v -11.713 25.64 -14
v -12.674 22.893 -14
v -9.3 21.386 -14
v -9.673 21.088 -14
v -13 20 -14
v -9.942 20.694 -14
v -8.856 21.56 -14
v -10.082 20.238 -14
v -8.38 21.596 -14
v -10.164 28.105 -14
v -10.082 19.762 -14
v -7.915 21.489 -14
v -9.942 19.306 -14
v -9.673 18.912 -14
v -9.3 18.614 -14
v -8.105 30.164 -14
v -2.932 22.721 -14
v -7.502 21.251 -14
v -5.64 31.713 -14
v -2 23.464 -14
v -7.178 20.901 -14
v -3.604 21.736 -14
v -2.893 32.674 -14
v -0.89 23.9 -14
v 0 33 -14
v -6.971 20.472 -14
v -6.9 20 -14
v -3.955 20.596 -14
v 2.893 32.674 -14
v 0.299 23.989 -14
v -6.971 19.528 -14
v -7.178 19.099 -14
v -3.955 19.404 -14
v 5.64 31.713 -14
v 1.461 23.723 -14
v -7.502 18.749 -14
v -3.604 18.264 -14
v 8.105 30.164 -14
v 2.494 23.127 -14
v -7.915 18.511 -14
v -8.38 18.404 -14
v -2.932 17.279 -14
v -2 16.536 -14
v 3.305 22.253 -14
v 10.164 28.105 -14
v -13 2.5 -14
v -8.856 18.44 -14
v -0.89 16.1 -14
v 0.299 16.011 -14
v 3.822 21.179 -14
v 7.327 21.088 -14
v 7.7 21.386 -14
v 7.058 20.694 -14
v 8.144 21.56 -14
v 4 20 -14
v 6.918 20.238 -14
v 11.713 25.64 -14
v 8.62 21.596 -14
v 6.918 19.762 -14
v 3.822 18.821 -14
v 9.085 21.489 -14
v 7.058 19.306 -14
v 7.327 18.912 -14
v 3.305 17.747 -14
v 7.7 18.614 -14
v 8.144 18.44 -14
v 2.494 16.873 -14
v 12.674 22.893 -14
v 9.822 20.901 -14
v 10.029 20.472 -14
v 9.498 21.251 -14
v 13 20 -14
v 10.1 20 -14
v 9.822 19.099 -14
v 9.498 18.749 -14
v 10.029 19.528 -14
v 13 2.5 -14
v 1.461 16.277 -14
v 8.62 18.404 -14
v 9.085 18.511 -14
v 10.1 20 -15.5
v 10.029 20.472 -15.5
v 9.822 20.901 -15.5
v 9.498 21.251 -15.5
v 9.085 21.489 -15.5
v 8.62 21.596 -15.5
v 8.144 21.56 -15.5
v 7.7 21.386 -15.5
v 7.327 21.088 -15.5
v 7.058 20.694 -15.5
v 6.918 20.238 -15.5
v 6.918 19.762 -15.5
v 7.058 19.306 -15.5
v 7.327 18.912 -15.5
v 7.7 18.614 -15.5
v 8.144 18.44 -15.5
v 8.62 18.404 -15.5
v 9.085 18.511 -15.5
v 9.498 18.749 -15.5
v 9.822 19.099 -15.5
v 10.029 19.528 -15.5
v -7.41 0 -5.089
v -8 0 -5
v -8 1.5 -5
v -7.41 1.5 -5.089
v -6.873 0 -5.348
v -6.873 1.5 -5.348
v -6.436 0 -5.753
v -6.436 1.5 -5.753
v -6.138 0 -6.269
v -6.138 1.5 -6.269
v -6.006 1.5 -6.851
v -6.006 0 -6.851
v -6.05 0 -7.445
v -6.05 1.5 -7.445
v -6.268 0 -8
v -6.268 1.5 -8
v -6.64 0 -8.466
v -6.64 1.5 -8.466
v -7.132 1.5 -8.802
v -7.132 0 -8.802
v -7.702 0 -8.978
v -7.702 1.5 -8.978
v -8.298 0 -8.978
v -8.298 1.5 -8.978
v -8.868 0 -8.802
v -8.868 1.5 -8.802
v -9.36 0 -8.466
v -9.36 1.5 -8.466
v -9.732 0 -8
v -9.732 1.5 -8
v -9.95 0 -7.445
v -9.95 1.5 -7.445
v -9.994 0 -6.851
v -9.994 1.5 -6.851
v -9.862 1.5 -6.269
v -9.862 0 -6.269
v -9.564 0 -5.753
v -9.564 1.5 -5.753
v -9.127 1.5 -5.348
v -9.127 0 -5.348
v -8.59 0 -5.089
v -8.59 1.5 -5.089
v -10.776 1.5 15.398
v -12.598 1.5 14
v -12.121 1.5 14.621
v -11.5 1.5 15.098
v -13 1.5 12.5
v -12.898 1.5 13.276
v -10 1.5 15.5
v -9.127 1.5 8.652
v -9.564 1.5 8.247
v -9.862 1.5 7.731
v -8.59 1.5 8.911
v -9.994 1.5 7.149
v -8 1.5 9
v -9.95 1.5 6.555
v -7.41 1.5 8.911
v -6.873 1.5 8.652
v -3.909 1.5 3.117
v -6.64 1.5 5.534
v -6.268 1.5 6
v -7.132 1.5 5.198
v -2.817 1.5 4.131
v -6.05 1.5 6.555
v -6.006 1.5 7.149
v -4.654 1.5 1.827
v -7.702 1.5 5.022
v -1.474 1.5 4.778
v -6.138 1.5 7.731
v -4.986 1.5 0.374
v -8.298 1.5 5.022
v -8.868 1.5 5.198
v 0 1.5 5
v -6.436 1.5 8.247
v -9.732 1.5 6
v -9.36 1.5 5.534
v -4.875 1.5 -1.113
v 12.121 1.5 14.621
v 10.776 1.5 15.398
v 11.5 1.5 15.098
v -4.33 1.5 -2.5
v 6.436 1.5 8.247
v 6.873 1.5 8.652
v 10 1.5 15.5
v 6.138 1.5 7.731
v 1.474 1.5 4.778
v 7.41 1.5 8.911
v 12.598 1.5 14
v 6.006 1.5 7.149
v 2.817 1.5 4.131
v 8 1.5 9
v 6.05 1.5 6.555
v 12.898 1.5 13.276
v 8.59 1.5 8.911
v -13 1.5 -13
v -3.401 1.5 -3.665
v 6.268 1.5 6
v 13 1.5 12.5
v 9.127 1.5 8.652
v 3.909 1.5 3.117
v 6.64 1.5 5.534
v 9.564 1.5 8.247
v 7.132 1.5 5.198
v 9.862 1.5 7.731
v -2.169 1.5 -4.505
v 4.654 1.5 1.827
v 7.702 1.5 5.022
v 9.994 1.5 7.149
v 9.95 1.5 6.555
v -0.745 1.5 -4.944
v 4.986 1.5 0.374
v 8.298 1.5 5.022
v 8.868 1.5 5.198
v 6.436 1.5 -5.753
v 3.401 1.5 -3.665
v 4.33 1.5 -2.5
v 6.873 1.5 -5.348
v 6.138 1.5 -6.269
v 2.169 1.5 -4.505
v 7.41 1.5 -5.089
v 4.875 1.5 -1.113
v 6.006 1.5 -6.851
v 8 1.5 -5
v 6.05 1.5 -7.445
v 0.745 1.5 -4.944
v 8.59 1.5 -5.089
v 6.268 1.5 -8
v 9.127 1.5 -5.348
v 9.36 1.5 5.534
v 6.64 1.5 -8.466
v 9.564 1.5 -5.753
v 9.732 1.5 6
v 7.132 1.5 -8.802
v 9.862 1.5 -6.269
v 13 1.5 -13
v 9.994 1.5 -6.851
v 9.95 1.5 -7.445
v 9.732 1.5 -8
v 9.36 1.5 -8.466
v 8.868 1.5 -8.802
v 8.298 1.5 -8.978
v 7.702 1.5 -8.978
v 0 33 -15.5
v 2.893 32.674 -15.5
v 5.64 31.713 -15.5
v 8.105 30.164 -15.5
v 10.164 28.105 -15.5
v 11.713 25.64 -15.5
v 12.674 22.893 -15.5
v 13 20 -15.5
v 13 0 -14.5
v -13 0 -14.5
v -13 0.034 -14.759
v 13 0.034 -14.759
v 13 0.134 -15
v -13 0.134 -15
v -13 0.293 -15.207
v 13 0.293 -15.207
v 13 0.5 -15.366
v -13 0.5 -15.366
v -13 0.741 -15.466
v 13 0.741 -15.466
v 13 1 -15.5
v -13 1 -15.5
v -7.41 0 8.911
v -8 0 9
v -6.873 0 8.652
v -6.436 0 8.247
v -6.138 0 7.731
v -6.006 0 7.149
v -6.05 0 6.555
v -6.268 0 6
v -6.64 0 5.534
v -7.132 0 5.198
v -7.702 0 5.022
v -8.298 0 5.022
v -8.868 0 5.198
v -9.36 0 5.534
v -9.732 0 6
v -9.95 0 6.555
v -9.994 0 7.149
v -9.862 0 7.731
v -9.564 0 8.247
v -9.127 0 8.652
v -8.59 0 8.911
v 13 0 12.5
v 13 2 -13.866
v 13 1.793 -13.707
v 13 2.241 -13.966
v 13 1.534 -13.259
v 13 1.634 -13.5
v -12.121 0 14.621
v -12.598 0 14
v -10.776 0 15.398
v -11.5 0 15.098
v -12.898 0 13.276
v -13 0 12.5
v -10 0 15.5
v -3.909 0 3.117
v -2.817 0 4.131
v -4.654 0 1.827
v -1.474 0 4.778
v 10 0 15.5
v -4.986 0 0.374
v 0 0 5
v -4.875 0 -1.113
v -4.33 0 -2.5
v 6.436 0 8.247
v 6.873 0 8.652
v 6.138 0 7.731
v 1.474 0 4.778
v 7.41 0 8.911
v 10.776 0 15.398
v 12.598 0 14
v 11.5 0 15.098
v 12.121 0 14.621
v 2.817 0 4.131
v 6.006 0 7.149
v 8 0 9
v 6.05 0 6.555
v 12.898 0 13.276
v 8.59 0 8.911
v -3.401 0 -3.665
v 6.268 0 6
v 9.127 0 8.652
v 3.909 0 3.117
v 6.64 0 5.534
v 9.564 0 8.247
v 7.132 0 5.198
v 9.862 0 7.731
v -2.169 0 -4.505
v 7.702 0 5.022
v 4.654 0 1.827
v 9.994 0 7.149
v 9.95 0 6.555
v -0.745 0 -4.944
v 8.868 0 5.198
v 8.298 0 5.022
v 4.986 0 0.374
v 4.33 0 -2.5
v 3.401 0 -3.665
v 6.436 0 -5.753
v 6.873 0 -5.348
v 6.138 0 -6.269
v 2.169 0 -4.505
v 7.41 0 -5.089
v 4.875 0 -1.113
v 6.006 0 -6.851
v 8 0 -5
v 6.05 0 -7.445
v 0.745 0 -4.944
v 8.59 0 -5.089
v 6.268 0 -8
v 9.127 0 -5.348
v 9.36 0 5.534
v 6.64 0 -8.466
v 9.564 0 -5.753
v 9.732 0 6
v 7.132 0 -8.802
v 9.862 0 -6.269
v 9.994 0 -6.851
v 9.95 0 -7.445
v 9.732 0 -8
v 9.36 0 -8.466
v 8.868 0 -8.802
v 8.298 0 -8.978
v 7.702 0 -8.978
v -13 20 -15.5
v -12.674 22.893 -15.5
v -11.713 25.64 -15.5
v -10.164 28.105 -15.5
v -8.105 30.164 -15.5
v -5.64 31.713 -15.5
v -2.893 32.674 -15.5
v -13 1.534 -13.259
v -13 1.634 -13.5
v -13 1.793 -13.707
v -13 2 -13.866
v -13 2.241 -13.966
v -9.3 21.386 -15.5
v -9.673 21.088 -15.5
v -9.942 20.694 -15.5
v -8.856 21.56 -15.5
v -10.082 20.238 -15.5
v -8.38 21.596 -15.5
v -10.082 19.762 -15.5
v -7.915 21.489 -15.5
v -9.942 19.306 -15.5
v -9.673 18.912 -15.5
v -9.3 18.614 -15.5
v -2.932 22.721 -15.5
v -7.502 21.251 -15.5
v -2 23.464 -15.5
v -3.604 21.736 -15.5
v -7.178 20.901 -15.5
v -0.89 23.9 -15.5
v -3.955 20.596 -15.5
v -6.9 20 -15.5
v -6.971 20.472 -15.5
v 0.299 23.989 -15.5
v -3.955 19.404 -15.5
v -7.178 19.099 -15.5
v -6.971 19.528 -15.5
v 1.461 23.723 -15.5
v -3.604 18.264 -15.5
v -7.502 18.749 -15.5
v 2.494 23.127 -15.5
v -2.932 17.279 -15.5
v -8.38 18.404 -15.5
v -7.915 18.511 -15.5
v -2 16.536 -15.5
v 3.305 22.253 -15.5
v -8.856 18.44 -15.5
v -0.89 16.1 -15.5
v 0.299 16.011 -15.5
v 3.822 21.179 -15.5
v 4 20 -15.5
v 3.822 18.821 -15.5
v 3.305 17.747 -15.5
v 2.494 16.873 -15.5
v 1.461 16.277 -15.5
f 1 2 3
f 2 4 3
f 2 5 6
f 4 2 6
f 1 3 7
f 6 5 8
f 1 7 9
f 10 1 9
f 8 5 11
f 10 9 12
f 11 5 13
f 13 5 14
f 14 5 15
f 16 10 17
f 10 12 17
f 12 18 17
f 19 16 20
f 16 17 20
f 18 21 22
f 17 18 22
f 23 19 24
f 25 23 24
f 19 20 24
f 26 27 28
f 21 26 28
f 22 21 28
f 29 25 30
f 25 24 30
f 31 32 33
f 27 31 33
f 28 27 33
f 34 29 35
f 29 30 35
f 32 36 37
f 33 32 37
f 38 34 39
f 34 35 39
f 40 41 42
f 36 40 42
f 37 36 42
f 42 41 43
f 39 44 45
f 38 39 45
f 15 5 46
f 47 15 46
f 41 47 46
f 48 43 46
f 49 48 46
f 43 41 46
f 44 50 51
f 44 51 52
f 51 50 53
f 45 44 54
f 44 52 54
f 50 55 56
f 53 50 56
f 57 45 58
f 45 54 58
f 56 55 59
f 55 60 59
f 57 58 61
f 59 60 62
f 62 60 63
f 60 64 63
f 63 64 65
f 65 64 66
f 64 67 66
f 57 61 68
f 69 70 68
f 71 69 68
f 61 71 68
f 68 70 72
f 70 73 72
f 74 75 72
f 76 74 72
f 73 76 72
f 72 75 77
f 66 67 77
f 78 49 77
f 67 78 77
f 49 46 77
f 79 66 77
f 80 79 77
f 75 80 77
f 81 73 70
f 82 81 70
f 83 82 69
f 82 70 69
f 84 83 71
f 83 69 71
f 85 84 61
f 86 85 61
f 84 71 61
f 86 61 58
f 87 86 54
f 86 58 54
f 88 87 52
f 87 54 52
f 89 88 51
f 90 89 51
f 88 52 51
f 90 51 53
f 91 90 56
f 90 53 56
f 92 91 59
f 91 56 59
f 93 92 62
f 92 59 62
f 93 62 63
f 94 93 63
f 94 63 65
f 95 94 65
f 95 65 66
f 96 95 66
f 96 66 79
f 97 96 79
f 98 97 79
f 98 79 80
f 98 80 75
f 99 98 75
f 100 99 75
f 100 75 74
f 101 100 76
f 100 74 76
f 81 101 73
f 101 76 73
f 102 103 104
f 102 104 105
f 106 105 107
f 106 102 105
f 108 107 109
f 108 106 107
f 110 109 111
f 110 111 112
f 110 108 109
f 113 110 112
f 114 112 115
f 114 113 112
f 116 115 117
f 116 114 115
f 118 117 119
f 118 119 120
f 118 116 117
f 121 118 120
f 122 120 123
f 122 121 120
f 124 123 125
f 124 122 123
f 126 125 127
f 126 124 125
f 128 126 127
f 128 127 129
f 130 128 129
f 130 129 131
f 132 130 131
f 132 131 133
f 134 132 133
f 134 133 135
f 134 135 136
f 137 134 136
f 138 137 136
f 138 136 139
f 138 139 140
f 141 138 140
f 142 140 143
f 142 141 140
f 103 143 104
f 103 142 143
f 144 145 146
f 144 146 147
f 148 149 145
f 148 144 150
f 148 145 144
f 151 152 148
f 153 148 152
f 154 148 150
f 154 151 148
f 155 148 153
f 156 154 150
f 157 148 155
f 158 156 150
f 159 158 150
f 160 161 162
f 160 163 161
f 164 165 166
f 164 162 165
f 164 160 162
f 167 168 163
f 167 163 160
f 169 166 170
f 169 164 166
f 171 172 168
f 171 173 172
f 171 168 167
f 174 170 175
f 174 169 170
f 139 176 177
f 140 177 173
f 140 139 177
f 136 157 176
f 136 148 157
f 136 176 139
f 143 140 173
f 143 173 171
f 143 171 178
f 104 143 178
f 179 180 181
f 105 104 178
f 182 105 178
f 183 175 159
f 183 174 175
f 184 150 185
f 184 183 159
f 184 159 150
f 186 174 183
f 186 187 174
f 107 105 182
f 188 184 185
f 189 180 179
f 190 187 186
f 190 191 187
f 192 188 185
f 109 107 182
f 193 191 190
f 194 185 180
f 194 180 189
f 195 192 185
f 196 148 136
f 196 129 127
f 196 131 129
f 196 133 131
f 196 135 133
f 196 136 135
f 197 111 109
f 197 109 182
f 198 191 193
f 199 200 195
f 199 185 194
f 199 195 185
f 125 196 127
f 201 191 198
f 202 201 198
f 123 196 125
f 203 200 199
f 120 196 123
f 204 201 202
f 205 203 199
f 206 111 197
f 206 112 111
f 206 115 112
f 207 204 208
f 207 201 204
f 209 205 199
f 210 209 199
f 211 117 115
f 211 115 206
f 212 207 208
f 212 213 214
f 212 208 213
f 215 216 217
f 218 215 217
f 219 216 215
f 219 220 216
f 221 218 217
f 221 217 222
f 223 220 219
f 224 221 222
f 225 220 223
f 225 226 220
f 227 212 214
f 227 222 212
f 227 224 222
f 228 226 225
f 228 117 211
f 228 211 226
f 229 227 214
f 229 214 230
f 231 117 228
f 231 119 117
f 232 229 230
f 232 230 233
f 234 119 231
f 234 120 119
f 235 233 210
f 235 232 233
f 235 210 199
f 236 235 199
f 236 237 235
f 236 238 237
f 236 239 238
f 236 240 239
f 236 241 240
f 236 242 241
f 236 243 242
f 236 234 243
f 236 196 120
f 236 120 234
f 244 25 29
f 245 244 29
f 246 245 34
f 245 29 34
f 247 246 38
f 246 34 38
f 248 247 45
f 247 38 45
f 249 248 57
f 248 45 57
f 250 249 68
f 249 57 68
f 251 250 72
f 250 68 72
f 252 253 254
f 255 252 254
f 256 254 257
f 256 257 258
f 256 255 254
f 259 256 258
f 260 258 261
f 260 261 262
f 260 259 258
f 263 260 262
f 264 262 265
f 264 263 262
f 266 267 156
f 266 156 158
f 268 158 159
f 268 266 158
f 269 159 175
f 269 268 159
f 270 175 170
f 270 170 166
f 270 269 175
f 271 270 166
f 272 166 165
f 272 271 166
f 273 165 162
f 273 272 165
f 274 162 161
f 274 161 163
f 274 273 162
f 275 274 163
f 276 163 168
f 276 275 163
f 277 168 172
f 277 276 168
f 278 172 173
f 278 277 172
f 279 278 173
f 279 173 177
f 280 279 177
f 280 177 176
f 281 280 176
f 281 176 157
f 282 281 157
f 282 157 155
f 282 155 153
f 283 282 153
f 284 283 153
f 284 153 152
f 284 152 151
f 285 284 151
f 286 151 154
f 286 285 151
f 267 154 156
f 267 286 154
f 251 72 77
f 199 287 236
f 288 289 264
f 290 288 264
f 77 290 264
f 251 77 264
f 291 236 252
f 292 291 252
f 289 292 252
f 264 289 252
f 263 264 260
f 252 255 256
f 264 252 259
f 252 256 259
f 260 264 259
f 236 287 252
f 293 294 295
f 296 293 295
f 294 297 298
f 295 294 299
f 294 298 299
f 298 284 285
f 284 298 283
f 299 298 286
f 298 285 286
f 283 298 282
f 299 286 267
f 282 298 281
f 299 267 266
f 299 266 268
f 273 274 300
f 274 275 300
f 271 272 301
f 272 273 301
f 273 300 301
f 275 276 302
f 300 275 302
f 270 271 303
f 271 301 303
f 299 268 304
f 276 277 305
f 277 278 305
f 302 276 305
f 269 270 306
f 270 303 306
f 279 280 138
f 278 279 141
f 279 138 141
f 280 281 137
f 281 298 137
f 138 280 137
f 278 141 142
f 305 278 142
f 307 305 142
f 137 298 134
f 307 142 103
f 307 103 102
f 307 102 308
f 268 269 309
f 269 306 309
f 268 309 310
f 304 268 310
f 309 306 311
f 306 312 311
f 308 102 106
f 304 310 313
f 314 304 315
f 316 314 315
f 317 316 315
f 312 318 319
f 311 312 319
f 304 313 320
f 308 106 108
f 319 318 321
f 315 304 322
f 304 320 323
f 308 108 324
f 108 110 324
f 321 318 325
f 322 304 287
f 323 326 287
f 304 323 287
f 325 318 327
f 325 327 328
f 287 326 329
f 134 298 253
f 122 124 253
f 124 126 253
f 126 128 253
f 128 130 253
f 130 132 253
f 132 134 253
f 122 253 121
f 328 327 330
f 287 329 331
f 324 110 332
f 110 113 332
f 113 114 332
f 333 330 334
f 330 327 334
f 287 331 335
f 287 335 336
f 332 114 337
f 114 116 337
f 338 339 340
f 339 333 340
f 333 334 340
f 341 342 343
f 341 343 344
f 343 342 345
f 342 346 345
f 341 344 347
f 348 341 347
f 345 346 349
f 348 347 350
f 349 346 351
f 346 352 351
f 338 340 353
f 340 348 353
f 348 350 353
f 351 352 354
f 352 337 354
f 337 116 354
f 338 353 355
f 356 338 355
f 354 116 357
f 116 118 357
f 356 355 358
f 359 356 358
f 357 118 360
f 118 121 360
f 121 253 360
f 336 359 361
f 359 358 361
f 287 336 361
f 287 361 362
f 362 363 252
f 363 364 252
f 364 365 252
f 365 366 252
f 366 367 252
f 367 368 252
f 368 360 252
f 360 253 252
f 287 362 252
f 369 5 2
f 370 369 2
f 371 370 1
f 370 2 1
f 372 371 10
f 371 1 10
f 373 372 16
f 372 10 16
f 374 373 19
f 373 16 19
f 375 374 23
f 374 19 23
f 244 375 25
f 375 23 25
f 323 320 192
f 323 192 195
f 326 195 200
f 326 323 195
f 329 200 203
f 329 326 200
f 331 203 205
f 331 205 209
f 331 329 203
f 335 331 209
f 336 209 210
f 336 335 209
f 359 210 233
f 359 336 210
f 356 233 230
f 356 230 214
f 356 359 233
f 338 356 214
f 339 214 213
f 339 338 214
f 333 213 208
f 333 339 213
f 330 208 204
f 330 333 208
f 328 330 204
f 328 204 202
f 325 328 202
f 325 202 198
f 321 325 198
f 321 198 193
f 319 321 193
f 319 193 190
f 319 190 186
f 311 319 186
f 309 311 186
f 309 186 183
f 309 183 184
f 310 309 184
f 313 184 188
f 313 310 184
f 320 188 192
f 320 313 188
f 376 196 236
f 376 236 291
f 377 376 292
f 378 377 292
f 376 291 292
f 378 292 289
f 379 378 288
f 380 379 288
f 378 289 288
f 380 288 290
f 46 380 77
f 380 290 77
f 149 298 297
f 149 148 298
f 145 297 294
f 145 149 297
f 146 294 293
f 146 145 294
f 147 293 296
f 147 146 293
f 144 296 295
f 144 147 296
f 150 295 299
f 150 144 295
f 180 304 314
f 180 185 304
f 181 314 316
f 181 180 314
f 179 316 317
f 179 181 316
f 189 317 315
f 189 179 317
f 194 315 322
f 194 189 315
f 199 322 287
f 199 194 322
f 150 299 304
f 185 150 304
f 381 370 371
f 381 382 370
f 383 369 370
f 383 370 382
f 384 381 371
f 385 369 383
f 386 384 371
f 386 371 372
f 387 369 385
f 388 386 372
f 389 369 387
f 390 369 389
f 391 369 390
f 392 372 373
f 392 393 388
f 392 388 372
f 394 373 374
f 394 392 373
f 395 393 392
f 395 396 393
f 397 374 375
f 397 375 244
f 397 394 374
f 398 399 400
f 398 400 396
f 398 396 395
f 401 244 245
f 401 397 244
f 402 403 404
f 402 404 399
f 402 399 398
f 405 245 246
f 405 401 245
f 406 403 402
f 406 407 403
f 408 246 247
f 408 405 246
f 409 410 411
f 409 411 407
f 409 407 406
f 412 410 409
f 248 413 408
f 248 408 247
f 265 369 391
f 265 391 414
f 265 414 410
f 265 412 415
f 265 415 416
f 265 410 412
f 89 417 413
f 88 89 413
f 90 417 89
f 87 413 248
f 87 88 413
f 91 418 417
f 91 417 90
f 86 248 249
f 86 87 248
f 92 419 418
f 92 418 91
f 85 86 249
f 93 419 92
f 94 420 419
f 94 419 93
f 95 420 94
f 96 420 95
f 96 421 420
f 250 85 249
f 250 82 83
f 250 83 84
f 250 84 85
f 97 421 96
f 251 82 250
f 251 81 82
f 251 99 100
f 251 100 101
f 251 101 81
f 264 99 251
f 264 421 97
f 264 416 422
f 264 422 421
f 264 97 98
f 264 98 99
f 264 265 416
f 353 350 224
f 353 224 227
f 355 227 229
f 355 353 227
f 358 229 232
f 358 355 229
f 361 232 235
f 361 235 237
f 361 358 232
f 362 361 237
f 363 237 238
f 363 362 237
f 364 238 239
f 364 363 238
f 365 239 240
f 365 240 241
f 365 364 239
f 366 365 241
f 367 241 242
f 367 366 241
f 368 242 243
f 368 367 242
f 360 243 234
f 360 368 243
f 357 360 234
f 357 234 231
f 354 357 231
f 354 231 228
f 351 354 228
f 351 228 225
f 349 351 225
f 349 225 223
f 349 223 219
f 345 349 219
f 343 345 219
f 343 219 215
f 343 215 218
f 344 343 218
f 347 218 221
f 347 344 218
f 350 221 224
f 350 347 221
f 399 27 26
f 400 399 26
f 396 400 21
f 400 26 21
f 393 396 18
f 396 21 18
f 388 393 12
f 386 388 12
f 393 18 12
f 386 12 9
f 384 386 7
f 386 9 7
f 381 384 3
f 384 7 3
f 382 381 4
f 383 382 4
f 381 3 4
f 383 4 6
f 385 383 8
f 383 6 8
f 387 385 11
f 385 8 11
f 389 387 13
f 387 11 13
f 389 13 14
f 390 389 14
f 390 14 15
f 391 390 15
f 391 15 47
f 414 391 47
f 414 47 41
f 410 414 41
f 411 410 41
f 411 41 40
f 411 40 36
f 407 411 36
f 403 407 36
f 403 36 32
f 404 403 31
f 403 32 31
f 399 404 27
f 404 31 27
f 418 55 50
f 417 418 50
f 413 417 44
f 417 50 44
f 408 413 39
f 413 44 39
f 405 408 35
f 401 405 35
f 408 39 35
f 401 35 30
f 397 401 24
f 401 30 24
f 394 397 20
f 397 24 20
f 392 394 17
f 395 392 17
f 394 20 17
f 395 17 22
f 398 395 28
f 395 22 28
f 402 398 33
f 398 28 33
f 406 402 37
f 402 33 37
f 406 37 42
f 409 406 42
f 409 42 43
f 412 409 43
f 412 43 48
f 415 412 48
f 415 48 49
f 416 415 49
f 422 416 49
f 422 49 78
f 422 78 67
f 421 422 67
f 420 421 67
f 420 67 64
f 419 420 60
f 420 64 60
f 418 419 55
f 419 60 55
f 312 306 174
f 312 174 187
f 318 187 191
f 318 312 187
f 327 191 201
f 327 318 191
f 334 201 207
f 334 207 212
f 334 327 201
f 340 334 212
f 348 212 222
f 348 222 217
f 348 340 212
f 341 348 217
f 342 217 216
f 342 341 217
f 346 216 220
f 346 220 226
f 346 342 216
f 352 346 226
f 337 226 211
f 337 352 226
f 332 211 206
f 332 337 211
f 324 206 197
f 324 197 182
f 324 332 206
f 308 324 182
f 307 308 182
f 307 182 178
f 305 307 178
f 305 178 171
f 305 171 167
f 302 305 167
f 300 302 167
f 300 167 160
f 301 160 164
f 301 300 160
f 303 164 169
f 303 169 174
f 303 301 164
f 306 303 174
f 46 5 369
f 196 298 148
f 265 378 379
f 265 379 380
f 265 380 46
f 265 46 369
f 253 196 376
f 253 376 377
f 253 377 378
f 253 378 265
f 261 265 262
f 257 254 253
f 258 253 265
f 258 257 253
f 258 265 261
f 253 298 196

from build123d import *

# Parameters (mm, degrees)
SKETCH1_W           = 26
SKETCH1_H           = 31
SKETCH1_R           = 5
SKETCH1_R_2         = 2
BOSS_EXTRUDE1_DEPTH = 1.5
SKETCH2_W           = 26
SKETCH2_H           = 1.5
BOSS_EXTRUDE2_DEPTH = 31.5
SKETCH3_R           = 1.6
SKETCH3_R_2         = 4
CUT_EXTRUDE1_DEPTH  = 1.5
FILLET1_R           = 1
FILLET2_R           = 3


with BuildPart() as part:
    # Sketch1 → Boss-Extrude1 (new body)
    with BuildSketch(Plane(origin=(0, 0, 0), x_dir=(1, 0, 0), z_dir=(0, 1, 0))):
        Rectangle(SKETCH1_W, SKETCH1_H)
        with Locations(Location((0, 0, 0), (0, 0, 270))):
            Circle(SKETCH1_R, mode=Mode.SUBTRACT)
        with Locations(Location((-8, 7, 0), (0, 0, 270))):
            Circle(SKETCH1_R_2, mode=Mode.SUBTRACT)
        with Locations(Location((8, 7, 0), (0, 0, 270))):
            Circle(SKETCH1_R_2, mode=Mode.SUBTRACT)
        with Locations(Location((-8, -7, 0), (0, 0, 270))):
            Circle(SKETCH1_R_2, mode=Mode.SUBTRACT)
        with Locations(Location((8, -7, 0), (0, 0, 270))):
            Circle(SKETCH1_R_2, mode=Mode.SUBTRACT)
    extrude(amount=BOSS_EXTRUDE1_DEPTH)

    # Sketch2 → Boss-Extrude2 (add)
    with BuildSketch(Plane(origin=(0, 1.5, 0), x_dir=(1, 0, 0), z_dir=(0, 1, 0))):
        with Locations((0, 14.75)):
            Rectangle(SKETCH2_W, SKETCH2_H)
    extrude(amount=BOSS_EXTRUDE2_DEPTH)

    # Sketch3 → Cut-Extrude1 (cut)
    with BuildSketch(Plane.XY.offset(-14)):
        with BuildLine():
            Line((-13, 33), (-13, 20))
            ThreePointArc((-13, 20), (-9.192388155, 29.192388155), (0, 33))
            Line((0, 33), (-13, 33))
        make_face()
        with BuildLine():
            Line((13, 33), (0, 33))
            ThreePointArc((0, 33), (9.192388155, 29.192388155), (13, 20))
            Line((13, 20), (13, 33))
        make_face()
        with Locations((-8.5, 20)):
            Circle(SKETCH3_R)
        with Locations((0, 20)):
            Circle(SKETCH3_R_2)
        with Locations((8.5, 20)):
            Circle(SKETCH3_R)
    extrude(amount=-CUT_EXTRUDE1_DEPTH, mode=Mode.SUBTRACT)

    # Fillet1
    fillet1_edges = [part.edges().sort_by_distance(p)[0] for p in [
        (0, 1.5, -14),
        (0, 0, -15.5),
    ]]
    fillet(fillet1_edges, radius=FILLET1_R)

    # Fillet2
    fillet2_edges = [part.edges().sort_by_distance(p)[0] for p in [
        (13, 0.75, 15.5),
        (-13, 0.75, 15.5),
    ]]
    fillet(fillet2_edges, radius=FILLET2_R)


solid = part.part
